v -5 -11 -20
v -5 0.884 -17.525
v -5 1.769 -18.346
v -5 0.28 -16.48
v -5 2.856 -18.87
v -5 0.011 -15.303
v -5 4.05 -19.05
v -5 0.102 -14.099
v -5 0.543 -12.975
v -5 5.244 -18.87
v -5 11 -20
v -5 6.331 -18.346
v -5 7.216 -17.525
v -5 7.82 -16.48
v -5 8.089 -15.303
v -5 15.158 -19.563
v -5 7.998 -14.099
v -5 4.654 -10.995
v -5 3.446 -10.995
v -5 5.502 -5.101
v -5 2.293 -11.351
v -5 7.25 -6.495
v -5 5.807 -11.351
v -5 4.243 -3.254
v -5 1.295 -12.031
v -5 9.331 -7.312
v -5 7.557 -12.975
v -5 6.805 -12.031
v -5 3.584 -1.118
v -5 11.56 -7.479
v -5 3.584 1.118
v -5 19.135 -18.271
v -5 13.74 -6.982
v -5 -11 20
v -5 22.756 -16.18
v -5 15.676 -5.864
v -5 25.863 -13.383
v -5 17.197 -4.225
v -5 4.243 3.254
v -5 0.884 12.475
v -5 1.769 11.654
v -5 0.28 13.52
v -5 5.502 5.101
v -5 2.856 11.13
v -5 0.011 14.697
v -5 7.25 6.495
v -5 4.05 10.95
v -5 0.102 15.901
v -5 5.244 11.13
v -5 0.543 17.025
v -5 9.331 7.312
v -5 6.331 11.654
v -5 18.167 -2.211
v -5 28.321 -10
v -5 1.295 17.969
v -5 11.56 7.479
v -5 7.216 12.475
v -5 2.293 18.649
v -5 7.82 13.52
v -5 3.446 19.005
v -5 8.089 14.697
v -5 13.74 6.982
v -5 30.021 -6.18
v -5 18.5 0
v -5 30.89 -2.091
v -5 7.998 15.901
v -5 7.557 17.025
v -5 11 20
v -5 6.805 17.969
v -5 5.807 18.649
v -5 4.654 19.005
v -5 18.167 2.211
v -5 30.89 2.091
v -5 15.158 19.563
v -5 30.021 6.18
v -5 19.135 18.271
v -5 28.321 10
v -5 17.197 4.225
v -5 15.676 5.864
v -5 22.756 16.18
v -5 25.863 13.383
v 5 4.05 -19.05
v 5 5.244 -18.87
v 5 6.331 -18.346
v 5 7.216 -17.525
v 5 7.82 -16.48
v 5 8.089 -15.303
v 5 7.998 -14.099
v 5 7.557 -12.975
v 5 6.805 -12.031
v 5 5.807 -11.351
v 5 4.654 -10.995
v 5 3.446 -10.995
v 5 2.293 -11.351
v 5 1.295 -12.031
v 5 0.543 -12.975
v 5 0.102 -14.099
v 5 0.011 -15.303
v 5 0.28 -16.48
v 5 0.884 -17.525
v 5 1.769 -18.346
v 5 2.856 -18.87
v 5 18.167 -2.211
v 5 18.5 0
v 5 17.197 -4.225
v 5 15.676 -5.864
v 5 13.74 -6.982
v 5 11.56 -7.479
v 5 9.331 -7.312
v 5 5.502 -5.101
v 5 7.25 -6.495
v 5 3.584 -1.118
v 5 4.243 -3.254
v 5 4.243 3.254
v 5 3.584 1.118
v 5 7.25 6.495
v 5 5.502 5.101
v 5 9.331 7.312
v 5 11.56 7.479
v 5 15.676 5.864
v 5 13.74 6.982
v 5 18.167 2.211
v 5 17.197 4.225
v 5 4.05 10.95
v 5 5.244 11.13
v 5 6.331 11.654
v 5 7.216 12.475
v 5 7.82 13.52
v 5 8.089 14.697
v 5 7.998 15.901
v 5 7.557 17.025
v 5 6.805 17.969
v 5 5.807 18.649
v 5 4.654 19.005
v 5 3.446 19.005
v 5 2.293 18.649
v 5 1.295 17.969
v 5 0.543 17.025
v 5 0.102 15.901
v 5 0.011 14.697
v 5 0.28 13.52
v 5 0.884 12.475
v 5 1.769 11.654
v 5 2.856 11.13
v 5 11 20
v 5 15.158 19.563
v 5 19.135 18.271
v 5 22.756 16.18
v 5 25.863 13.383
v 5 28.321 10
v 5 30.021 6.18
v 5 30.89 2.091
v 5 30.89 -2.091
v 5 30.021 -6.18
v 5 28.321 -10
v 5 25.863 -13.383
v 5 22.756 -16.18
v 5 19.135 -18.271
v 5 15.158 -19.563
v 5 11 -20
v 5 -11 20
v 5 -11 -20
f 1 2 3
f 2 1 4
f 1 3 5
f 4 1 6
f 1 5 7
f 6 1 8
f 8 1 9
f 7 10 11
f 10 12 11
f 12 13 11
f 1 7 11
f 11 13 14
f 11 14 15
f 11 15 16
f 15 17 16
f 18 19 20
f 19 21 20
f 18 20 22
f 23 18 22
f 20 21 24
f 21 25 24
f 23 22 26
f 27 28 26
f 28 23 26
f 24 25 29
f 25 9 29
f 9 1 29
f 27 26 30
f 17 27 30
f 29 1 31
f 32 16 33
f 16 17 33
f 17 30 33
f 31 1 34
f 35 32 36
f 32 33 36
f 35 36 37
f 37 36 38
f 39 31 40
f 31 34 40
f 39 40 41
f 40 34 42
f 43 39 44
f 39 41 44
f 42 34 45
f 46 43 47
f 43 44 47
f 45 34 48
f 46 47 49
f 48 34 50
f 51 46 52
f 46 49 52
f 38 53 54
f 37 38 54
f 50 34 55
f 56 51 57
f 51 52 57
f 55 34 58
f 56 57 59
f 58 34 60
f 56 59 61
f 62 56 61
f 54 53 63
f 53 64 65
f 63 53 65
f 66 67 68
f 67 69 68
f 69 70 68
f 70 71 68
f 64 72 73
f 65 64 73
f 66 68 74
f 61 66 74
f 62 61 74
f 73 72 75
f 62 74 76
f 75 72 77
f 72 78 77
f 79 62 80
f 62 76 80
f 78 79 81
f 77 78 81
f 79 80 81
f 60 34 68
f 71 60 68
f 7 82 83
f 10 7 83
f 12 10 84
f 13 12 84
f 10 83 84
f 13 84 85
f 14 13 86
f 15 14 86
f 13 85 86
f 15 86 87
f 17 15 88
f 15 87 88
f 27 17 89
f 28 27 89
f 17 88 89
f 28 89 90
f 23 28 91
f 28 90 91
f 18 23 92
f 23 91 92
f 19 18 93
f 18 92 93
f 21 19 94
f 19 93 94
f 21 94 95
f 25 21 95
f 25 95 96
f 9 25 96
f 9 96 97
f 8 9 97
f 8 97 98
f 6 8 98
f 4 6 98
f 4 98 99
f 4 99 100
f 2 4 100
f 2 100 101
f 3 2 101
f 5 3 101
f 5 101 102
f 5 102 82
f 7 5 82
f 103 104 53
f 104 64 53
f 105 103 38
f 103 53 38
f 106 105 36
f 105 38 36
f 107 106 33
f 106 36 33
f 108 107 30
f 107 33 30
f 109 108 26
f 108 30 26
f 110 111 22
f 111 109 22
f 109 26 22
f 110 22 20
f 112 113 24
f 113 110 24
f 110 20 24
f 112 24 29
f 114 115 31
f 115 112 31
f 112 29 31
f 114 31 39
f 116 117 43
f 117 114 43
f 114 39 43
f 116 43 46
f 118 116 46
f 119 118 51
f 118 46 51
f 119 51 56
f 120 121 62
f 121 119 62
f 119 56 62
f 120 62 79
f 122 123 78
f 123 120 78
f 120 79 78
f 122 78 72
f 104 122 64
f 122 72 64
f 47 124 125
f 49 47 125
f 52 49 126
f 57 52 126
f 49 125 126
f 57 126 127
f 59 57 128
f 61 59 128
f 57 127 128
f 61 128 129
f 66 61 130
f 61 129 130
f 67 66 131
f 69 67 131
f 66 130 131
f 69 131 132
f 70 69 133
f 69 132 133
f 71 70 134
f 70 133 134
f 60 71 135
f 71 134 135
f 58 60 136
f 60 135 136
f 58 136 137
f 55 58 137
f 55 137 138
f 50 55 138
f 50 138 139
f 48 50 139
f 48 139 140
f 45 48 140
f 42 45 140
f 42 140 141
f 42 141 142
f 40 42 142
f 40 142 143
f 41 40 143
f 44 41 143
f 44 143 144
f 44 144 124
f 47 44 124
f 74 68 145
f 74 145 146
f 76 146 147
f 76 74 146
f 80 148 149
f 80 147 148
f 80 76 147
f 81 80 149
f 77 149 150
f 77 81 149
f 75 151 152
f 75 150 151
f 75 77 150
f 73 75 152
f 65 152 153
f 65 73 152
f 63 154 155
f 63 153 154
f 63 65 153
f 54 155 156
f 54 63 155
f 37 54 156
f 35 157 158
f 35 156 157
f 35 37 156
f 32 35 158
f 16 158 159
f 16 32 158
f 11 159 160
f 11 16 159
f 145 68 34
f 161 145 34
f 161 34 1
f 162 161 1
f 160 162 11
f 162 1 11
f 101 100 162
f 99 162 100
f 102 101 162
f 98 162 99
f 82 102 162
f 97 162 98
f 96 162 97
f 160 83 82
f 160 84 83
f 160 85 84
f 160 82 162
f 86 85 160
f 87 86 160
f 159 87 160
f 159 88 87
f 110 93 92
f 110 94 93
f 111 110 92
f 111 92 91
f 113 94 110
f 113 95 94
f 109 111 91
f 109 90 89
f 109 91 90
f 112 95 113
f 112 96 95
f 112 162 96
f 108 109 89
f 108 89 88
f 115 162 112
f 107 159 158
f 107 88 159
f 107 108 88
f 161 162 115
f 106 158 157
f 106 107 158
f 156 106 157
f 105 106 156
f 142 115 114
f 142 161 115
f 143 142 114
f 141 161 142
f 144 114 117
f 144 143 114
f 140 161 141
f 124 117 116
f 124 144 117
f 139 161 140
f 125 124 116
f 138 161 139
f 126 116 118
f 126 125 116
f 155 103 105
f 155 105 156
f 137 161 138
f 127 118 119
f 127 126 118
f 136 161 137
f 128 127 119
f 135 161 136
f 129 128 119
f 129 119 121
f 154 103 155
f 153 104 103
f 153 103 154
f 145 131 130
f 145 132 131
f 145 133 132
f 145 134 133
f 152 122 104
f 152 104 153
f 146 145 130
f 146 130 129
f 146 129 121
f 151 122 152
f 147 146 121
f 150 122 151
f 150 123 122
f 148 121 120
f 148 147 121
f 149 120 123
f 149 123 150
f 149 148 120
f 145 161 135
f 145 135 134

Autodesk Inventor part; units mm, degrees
ref_plane "YZ Plane" through (0, 0, 0) normal (1, 0, 0) x (0, 1, 0)
ref_plane "XZ Plane" through (0, 0, 0) normal (0, 1, 0) x (-1, 0, 0)
ref_plane "XY Plane" through (0, 0, 0) normal (0, 0, 1) x (1, 0, 0)
sketch "Sketch1" plane through (0, 0, 0) normal (1, 0, 0) x (0, 1, 0)
  line L0 (-11, -20) -> (11, -20)
  arc A0 (11, -20) -> (11, 20) centre (11, 0) ccw
  line L1 (11, 20) -> (-11, 20)
  line L2 (-11, 20) -> (-11, -20)
  circle A1 centre (11, 0) radius 7.5
  point P0 (0, 0)
  point P1 (0, -20)
  dimension "d0" = 22
  dimension "d1" = 22
  dimension "d2" = 40
  dimension "d3" = 15
extrude "Extrusion1" add sketch "Sketch1" along normal mid plane 10
sketch "Sketch2" plane through (5, 0, 0) normal (1, 0, 0) x (0, 0, -1)
  arc A0 (20, 11) -> (-20, 11) centre (0, 11) ccw construction
  line L0 (-20, 11) -> (-20, -11) construction
  line L1 (-20, -11) -> (20, -11) construction
  line L2 (20, -11) -> (20, 11) construction
  circle A1 centre (0, 11) radius 7.5 construction
  circle A2 centre (15, 4.05) radius 4.05
  line L3 (0, 11) -> (0, -11) construction
  line L4 (-20, -11) -> (20, -11) construction
  circle A3 centre (-15, 4.05) radius 4.05
  point P0 (0, 0)
  dimension "d6" = 15.05
  dimension "d7" = 8.1
  dimension "d8" = 5
extrude "Extrusion2" cut sketch "Sketch2" against normal through all
properties part number "arco_obj4"
